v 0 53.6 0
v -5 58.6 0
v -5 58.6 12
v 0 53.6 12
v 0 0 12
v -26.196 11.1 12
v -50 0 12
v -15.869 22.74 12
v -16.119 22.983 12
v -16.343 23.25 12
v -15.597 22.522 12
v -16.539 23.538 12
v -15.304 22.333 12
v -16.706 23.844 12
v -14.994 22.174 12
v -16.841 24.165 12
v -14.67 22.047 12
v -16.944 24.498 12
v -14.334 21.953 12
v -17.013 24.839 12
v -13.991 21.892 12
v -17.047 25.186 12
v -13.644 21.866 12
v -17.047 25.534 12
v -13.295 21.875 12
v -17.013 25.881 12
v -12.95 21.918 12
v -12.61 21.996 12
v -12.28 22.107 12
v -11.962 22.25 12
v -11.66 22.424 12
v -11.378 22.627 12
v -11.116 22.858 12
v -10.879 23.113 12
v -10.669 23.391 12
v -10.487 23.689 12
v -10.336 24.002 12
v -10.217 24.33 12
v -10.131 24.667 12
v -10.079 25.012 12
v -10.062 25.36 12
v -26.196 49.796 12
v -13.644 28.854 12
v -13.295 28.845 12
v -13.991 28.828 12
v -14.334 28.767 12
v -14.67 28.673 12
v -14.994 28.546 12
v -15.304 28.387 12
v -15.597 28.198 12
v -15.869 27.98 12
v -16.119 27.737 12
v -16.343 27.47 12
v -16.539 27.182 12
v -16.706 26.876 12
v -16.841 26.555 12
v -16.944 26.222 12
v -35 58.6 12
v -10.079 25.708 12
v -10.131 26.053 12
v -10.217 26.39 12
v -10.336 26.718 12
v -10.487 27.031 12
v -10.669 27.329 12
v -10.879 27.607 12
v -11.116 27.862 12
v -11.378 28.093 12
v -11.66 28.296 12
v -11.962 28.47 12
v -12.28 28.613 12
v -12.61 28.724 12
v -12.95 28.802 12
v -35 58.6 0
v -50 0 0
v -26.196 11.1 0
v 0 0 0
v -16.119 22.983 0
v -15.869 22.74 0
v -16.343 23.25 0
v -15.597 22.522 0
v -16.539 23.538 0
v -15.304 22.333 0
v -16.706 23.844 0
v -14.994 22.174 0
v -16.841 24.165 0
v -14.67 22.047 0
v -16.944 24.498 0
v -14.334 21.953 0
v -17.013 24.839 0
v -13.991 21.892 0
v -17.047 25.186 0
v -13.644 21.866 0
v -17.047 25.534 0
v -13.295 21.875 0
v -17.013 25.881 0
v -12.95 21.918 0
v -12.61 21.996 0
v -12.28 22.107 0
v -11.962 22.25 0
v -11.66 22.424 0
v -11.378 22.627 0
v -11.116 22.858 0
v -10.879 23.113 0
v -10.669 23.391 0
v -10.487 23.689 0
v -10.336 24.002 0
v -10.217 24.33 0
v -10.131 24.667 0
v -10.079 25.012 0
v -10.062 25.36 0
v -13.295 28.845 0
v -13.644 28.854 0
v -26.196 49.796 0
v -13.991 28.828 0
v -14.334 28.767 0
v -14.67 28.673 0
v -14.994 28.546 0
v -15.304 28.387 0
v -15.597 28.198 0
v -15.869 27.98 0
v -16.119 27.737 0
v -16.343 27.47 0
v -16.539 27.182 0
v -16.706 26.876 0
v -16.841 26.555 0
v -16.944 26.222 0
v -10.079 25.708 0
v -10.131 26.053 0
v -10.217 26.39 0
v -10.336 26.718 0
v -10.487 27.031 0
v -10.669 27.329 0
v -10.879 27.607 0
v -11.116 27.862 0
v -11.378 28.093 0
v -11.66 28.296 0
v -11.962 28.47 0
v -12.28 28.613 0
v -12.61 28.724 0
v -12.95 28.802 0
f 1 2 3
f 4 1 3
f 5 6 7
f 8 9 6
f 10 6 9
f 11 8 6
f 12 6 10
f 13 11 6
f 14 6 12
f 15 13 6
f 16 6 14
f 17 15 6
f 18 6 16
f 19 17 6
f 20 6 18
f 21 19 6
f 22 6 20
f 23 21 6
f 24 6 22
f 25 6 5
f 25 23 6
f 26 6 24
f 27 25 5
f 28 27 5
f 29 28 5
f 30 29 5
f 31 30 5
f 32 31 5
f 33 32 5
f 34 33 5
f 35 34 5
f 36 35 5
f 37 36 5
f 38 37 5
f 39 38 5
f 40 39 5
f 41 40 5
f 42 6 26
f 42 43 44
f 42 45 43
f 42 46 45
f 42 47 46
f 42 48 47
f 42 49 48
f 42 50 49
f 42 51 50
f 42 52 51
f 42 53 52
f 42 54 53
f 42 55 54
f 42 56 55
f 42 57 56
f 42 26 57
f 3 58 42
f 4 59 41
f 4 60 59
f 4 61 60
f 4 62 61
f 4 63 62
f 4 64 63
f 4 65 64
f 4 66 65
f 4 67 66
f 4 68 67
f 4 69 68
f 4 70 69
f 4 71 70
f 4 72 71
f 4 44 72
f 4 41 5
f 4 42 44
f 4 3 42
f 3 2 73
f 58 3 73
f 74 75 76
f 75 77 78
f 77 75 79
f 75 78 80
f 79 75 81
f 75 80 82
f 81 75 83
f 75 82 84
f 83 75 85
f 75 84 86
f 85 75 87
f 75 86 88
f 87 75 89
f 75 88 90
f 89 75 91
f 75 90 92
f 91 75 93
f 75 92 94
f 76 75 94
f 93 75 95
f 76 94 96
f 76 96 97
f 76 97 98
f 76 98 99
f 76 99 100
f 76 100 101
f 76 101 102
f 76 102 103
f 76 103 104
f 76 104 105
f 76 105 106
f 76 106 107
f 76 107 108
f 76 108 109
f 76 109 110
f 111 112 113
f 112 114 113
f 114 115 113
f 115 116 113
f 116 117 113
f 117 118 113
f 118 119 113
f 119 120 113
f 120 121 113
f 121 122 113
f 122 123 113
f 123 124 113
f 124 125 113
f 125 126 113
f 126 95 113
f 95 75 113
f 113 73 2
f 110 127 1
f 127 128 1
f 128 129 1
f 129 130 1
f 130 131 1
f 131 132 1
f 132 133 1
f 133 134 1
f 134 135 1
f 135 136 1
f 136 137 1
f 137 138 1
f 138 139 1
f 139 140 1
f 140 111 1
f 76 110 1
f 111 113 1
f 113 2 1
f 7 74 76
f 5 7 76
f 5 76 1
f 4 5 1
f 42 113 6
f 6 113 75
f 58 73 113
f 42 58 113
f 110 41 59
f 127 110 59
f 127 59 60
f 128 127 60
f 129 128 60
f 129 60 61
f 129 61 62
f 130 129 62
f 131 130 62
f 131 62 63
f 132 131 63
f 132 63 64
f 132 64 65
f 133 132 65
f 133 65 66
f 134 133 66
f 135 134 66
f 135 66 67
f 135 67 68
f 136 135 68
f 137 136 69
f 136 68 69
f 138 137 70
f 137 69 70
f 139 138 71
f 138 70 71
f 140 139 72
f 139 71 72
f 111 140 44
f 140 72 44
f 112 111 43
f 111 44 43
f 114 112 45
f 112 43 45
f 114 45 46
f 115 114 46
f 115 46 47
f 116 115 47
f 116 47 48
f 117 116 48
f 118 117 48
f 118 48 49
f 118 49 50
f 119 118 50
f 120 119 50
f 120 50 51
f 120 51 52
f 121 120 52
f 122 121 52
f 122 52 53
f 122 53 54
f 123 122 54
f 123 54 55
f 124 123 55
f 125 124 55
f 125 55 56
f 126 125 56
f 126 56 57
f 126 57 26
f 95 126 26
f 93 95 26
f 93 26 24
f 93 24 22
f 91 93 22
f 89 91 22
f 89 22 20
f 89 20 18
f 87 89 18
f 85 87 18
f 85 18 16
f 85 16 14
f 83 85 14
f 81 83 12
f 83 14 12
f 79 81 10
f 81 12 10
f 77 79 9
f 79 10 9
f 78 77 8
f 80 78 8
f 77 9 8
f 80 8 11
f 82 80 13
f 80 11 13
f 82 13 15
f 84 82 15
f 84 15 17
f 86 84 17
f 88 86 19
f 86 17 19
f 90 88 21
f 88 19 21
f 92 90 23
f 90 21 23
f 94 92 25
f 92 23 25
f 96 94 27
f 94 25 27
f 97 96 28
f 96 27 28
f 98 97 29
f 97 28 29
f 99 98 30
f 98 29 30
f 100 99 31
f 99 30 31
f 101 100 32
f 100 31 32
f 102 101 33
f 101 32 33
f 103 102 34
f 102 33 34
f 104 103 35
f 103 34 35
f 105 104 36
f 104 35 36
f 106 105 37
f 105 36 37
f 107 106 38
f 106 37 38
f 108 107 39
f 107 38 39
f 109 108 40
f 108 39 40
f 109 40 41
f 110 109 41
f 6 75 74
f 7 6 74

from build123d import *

# Parameters (mm, degrees)
BOSS_EXTRUDE1_DEPTH = 12
SKETCH3_R           = 3.495
CUT_EXTRUDE2_DEPTH  = 78.961272437
CHAMFER1_SIZE       = 5


with BuildPart() as part:
    # Sketch1 → Boss-Extrude1 (new body)
    with BuildSketch(Plane.XY):
        Polygon((0, 0), (0, 58.6), (-35, 58.6), (-26.195973182, 49.795973182), (-26.195973182, 11.1), (-50, 0), align=None)
    extrude(amount=BOSS_EXTRUDE1_DEPTH)

    # Sketch3 → Cut-Extrude2 (cut, through all)
    with BuildSketch(Plane.XY.offset(12)):
        with Locations((-13.556619589, 25.36)):
            Circle(SKETCH3_R)
    extrude(amount=-CUT_EXTRUDE2_DEPTH, mode=Mode.SUBTRACT)

    # Chamfer1
    chamfer1_edges = [part.edges().sort_by_distance(p)[0] for p in [
        (0, 58.6, 6),
    ]]
    chamfer(chamfer1_edges, length=CHAMFER1_SIZE)


solid = part.part
